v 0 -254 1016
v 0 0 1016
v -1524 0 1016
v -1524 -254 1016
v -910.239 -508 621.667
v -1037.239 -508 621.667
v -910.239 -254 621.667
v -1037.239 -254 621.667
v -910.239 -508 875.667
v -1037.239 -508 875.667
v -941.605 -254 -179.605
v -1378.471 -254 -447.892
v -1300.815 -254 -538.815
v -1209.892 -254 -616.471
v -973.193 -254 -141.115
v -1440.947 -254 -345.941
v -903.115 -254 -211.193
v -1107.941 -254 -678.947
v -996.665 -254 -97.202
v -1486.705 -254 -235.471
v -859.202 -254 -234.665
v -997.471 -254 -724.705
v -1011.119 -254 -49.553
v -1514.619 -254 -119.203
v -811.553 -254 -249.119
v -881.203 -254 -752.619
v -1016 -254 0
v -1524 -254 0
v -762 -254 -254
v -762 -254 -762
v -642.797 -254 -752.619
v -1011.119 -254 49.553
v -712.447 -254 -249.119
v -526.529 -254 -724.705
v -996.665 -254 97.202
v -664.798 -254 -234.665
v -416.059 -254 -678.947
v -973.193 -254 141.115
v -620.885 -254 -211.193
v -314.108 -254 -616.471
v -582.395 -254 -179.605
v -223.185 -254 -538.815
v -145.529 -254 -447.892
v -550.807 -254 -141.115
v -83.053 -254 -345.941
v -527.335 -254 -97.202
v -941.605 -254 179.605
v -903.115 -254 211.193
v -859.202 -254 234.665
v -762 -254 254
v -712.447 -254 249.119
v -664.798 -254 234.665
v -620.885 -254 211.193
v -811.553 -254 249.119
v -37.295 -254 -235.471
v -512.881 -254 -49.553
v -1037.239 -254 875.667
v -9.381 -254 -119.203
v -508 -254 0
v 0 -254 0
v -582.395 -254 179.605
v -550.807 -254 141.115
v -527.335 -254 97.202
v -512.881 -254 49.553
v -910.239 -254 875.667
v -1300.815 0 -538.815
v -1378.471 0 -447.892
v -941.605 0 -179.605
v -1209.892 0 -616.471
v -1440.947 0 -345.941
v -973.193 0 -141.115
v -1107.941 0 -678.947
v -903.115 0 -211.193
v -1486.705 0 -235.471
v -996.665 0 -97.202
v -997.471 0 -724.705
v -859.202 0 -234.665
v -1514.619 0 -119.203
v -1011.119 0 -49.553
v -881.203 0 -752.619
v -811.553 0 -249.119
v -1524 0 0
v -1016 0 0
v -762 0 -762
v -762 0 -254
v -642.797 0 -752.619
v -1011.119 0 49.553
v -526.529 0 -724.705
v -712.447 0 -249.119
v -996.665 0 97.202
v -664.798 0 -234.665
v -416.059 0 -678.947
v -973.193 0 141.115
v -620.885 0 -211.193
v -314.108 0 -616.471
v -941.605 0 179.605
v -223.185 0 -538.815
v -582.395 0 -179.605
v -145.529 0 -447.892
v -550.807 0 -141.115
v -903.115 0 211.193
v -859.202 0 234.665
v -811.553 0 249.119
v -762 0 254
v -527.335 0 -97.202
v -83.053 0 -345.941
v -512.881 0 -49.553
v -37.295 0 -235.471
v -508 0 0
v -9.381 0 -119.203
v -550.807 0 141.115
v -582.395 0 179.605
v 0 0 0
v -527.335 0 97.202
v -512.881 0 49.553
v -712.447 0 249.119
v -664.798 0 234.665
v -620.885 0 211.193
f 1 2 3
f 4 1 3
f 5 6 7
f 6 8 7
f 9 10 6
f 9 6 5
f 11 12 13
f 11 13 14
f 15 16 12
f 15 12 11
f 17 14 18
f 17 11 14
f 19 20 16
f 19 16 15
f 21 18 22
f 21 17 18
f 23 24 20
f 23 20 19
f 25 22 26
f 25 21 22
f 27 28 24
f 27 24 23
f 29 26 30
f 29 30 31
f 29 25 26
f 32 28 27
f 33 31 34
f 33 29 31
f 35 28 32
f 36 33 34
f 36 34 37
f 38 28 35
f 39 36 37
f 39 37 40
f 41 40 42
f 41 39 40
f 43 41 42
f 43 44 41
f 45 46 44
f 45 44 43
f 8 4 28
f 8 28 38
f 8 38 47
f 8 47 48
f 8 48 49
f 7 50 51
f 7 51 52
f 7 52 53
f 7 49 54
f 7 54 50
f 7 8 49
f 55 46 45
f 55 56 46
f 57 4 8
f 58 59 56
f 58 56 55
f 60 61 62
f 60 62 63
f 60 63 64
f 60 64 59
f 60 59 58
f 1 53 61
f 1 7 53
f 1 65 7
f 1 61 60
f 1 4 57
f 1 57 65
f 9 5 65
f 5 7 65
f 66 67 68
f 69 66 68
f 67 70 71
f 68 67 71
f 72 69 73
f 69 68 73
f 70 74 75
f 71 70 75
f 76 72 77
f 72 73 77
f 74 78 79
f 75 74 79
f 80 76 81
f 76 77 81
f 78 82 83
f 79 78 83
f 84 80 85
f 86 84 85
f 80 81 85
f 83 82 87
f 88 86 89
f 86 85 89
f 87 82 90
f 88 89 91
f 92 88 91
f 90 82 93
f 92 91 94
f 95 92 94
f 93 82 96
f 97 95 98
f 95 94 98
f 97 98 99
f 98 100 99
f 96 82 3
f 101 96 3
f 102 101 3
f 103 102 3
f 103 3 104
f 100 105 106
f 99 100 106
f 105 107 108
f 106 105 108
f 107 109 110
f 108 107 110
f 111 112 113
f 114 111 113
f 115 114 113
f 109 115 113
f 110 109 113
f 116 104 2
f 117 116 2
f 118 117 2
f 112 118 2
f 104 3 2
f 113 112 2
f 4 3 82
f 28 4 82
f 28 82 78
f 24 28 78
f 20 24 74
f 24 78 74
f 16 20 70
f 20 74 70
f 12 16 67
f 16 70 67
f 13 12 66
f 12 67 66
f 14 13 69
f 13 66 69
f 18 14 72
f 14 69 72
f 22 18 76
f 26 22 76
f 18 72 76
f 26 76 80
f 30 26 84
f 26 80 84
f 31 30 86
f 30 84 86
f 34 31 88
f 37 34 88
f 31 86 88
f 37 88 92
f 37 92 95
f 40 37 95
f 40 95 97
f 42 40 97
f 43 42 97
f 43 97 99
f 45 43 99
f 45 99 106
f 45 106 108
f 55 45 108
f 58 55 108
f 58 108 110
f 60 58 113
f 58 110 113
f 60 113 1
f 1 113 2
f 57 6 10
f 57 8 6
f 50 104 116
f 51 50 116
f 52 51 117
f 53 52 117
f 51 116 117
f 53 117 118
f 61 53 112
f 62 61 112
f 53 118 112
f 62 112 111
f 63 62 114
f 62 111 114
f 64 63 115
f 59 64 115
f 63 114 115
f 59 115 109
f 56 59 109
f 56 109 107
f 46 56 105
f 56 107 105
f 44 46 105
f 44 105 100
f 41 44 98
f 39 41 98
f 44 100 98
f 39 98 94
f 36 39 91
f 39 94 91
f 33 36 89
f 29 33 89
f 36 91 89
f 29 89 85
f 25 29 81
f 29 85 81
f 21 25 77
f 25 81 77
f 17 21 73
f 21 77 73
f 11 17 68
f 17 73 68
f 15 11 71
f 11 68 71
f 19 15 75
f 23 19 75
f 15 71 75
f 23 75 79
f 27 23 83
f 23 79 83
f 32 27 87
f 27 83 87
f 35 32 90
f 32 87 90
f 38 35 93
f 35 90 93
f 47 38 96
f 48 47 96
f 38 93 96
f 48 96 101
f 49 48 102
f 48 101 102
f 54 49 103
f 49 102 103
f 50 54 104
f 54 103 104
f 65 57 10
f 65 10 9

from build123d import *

# Parameters (mm, degrees)
F0_W     = 254
F0_H     = 254
F1_DEPTH = 254
F2_W     = 127
F2_H     = 254
F3_DEPTH = 127
F4_DEPTH = 127


with BuildPart() as f1:
    # F0 (on Front) → F1 (new body)
    with BuildSketch(Plane.XZ):
        Polygon((-254, 1016), (-1524, 1016), (-1524, 254), (-762, 254), (0, 254), (0, 762), (-254, 762), align=None)
        with Locations((-127, 889)):
            Rectangle(F0_W, F0_H)
        with BuildLine():
            Line((-762, 254), (-1524, 254))
            Line((-1524, 254), (-1524, 0))
            ThreePointArc((-1524, 0), (-762, -762), (0, 0))
            Line((0, 0), (0, 254))
            Line((0, 254), (-762, 254))
        make_face()
        with BuildLine():
            ThreePointArc((-508, 0), (-941.6051224214, -179.6051224214), (-762, 254))
            ThreePointArc((-762, 254), (-582.3948775786, 179.6051224214), (-508, 0))
        make_face(mode=Mode.SUBTRACT)
    extrude(amount=F1_DEPTH)

    # F2 (on face) → F3 (join)
    with BuildSketch(Plane.XZ.offset(254)):
        with Locations((-973.7388785046, 748.6669676349)):
            Rectangle(F2_W, F2_H)
    extrude(amount=F3_DEPTH)

    # F4 (add): a face of the model
    f4_faces = [f1.faces().sort_by_distance(p)[0] for p in [
        (-973.7388785046, -381, 748.6669676349),
    ]]
    extrude(f4_faces, amount=F4_DEPTH)


solid = f1.part
